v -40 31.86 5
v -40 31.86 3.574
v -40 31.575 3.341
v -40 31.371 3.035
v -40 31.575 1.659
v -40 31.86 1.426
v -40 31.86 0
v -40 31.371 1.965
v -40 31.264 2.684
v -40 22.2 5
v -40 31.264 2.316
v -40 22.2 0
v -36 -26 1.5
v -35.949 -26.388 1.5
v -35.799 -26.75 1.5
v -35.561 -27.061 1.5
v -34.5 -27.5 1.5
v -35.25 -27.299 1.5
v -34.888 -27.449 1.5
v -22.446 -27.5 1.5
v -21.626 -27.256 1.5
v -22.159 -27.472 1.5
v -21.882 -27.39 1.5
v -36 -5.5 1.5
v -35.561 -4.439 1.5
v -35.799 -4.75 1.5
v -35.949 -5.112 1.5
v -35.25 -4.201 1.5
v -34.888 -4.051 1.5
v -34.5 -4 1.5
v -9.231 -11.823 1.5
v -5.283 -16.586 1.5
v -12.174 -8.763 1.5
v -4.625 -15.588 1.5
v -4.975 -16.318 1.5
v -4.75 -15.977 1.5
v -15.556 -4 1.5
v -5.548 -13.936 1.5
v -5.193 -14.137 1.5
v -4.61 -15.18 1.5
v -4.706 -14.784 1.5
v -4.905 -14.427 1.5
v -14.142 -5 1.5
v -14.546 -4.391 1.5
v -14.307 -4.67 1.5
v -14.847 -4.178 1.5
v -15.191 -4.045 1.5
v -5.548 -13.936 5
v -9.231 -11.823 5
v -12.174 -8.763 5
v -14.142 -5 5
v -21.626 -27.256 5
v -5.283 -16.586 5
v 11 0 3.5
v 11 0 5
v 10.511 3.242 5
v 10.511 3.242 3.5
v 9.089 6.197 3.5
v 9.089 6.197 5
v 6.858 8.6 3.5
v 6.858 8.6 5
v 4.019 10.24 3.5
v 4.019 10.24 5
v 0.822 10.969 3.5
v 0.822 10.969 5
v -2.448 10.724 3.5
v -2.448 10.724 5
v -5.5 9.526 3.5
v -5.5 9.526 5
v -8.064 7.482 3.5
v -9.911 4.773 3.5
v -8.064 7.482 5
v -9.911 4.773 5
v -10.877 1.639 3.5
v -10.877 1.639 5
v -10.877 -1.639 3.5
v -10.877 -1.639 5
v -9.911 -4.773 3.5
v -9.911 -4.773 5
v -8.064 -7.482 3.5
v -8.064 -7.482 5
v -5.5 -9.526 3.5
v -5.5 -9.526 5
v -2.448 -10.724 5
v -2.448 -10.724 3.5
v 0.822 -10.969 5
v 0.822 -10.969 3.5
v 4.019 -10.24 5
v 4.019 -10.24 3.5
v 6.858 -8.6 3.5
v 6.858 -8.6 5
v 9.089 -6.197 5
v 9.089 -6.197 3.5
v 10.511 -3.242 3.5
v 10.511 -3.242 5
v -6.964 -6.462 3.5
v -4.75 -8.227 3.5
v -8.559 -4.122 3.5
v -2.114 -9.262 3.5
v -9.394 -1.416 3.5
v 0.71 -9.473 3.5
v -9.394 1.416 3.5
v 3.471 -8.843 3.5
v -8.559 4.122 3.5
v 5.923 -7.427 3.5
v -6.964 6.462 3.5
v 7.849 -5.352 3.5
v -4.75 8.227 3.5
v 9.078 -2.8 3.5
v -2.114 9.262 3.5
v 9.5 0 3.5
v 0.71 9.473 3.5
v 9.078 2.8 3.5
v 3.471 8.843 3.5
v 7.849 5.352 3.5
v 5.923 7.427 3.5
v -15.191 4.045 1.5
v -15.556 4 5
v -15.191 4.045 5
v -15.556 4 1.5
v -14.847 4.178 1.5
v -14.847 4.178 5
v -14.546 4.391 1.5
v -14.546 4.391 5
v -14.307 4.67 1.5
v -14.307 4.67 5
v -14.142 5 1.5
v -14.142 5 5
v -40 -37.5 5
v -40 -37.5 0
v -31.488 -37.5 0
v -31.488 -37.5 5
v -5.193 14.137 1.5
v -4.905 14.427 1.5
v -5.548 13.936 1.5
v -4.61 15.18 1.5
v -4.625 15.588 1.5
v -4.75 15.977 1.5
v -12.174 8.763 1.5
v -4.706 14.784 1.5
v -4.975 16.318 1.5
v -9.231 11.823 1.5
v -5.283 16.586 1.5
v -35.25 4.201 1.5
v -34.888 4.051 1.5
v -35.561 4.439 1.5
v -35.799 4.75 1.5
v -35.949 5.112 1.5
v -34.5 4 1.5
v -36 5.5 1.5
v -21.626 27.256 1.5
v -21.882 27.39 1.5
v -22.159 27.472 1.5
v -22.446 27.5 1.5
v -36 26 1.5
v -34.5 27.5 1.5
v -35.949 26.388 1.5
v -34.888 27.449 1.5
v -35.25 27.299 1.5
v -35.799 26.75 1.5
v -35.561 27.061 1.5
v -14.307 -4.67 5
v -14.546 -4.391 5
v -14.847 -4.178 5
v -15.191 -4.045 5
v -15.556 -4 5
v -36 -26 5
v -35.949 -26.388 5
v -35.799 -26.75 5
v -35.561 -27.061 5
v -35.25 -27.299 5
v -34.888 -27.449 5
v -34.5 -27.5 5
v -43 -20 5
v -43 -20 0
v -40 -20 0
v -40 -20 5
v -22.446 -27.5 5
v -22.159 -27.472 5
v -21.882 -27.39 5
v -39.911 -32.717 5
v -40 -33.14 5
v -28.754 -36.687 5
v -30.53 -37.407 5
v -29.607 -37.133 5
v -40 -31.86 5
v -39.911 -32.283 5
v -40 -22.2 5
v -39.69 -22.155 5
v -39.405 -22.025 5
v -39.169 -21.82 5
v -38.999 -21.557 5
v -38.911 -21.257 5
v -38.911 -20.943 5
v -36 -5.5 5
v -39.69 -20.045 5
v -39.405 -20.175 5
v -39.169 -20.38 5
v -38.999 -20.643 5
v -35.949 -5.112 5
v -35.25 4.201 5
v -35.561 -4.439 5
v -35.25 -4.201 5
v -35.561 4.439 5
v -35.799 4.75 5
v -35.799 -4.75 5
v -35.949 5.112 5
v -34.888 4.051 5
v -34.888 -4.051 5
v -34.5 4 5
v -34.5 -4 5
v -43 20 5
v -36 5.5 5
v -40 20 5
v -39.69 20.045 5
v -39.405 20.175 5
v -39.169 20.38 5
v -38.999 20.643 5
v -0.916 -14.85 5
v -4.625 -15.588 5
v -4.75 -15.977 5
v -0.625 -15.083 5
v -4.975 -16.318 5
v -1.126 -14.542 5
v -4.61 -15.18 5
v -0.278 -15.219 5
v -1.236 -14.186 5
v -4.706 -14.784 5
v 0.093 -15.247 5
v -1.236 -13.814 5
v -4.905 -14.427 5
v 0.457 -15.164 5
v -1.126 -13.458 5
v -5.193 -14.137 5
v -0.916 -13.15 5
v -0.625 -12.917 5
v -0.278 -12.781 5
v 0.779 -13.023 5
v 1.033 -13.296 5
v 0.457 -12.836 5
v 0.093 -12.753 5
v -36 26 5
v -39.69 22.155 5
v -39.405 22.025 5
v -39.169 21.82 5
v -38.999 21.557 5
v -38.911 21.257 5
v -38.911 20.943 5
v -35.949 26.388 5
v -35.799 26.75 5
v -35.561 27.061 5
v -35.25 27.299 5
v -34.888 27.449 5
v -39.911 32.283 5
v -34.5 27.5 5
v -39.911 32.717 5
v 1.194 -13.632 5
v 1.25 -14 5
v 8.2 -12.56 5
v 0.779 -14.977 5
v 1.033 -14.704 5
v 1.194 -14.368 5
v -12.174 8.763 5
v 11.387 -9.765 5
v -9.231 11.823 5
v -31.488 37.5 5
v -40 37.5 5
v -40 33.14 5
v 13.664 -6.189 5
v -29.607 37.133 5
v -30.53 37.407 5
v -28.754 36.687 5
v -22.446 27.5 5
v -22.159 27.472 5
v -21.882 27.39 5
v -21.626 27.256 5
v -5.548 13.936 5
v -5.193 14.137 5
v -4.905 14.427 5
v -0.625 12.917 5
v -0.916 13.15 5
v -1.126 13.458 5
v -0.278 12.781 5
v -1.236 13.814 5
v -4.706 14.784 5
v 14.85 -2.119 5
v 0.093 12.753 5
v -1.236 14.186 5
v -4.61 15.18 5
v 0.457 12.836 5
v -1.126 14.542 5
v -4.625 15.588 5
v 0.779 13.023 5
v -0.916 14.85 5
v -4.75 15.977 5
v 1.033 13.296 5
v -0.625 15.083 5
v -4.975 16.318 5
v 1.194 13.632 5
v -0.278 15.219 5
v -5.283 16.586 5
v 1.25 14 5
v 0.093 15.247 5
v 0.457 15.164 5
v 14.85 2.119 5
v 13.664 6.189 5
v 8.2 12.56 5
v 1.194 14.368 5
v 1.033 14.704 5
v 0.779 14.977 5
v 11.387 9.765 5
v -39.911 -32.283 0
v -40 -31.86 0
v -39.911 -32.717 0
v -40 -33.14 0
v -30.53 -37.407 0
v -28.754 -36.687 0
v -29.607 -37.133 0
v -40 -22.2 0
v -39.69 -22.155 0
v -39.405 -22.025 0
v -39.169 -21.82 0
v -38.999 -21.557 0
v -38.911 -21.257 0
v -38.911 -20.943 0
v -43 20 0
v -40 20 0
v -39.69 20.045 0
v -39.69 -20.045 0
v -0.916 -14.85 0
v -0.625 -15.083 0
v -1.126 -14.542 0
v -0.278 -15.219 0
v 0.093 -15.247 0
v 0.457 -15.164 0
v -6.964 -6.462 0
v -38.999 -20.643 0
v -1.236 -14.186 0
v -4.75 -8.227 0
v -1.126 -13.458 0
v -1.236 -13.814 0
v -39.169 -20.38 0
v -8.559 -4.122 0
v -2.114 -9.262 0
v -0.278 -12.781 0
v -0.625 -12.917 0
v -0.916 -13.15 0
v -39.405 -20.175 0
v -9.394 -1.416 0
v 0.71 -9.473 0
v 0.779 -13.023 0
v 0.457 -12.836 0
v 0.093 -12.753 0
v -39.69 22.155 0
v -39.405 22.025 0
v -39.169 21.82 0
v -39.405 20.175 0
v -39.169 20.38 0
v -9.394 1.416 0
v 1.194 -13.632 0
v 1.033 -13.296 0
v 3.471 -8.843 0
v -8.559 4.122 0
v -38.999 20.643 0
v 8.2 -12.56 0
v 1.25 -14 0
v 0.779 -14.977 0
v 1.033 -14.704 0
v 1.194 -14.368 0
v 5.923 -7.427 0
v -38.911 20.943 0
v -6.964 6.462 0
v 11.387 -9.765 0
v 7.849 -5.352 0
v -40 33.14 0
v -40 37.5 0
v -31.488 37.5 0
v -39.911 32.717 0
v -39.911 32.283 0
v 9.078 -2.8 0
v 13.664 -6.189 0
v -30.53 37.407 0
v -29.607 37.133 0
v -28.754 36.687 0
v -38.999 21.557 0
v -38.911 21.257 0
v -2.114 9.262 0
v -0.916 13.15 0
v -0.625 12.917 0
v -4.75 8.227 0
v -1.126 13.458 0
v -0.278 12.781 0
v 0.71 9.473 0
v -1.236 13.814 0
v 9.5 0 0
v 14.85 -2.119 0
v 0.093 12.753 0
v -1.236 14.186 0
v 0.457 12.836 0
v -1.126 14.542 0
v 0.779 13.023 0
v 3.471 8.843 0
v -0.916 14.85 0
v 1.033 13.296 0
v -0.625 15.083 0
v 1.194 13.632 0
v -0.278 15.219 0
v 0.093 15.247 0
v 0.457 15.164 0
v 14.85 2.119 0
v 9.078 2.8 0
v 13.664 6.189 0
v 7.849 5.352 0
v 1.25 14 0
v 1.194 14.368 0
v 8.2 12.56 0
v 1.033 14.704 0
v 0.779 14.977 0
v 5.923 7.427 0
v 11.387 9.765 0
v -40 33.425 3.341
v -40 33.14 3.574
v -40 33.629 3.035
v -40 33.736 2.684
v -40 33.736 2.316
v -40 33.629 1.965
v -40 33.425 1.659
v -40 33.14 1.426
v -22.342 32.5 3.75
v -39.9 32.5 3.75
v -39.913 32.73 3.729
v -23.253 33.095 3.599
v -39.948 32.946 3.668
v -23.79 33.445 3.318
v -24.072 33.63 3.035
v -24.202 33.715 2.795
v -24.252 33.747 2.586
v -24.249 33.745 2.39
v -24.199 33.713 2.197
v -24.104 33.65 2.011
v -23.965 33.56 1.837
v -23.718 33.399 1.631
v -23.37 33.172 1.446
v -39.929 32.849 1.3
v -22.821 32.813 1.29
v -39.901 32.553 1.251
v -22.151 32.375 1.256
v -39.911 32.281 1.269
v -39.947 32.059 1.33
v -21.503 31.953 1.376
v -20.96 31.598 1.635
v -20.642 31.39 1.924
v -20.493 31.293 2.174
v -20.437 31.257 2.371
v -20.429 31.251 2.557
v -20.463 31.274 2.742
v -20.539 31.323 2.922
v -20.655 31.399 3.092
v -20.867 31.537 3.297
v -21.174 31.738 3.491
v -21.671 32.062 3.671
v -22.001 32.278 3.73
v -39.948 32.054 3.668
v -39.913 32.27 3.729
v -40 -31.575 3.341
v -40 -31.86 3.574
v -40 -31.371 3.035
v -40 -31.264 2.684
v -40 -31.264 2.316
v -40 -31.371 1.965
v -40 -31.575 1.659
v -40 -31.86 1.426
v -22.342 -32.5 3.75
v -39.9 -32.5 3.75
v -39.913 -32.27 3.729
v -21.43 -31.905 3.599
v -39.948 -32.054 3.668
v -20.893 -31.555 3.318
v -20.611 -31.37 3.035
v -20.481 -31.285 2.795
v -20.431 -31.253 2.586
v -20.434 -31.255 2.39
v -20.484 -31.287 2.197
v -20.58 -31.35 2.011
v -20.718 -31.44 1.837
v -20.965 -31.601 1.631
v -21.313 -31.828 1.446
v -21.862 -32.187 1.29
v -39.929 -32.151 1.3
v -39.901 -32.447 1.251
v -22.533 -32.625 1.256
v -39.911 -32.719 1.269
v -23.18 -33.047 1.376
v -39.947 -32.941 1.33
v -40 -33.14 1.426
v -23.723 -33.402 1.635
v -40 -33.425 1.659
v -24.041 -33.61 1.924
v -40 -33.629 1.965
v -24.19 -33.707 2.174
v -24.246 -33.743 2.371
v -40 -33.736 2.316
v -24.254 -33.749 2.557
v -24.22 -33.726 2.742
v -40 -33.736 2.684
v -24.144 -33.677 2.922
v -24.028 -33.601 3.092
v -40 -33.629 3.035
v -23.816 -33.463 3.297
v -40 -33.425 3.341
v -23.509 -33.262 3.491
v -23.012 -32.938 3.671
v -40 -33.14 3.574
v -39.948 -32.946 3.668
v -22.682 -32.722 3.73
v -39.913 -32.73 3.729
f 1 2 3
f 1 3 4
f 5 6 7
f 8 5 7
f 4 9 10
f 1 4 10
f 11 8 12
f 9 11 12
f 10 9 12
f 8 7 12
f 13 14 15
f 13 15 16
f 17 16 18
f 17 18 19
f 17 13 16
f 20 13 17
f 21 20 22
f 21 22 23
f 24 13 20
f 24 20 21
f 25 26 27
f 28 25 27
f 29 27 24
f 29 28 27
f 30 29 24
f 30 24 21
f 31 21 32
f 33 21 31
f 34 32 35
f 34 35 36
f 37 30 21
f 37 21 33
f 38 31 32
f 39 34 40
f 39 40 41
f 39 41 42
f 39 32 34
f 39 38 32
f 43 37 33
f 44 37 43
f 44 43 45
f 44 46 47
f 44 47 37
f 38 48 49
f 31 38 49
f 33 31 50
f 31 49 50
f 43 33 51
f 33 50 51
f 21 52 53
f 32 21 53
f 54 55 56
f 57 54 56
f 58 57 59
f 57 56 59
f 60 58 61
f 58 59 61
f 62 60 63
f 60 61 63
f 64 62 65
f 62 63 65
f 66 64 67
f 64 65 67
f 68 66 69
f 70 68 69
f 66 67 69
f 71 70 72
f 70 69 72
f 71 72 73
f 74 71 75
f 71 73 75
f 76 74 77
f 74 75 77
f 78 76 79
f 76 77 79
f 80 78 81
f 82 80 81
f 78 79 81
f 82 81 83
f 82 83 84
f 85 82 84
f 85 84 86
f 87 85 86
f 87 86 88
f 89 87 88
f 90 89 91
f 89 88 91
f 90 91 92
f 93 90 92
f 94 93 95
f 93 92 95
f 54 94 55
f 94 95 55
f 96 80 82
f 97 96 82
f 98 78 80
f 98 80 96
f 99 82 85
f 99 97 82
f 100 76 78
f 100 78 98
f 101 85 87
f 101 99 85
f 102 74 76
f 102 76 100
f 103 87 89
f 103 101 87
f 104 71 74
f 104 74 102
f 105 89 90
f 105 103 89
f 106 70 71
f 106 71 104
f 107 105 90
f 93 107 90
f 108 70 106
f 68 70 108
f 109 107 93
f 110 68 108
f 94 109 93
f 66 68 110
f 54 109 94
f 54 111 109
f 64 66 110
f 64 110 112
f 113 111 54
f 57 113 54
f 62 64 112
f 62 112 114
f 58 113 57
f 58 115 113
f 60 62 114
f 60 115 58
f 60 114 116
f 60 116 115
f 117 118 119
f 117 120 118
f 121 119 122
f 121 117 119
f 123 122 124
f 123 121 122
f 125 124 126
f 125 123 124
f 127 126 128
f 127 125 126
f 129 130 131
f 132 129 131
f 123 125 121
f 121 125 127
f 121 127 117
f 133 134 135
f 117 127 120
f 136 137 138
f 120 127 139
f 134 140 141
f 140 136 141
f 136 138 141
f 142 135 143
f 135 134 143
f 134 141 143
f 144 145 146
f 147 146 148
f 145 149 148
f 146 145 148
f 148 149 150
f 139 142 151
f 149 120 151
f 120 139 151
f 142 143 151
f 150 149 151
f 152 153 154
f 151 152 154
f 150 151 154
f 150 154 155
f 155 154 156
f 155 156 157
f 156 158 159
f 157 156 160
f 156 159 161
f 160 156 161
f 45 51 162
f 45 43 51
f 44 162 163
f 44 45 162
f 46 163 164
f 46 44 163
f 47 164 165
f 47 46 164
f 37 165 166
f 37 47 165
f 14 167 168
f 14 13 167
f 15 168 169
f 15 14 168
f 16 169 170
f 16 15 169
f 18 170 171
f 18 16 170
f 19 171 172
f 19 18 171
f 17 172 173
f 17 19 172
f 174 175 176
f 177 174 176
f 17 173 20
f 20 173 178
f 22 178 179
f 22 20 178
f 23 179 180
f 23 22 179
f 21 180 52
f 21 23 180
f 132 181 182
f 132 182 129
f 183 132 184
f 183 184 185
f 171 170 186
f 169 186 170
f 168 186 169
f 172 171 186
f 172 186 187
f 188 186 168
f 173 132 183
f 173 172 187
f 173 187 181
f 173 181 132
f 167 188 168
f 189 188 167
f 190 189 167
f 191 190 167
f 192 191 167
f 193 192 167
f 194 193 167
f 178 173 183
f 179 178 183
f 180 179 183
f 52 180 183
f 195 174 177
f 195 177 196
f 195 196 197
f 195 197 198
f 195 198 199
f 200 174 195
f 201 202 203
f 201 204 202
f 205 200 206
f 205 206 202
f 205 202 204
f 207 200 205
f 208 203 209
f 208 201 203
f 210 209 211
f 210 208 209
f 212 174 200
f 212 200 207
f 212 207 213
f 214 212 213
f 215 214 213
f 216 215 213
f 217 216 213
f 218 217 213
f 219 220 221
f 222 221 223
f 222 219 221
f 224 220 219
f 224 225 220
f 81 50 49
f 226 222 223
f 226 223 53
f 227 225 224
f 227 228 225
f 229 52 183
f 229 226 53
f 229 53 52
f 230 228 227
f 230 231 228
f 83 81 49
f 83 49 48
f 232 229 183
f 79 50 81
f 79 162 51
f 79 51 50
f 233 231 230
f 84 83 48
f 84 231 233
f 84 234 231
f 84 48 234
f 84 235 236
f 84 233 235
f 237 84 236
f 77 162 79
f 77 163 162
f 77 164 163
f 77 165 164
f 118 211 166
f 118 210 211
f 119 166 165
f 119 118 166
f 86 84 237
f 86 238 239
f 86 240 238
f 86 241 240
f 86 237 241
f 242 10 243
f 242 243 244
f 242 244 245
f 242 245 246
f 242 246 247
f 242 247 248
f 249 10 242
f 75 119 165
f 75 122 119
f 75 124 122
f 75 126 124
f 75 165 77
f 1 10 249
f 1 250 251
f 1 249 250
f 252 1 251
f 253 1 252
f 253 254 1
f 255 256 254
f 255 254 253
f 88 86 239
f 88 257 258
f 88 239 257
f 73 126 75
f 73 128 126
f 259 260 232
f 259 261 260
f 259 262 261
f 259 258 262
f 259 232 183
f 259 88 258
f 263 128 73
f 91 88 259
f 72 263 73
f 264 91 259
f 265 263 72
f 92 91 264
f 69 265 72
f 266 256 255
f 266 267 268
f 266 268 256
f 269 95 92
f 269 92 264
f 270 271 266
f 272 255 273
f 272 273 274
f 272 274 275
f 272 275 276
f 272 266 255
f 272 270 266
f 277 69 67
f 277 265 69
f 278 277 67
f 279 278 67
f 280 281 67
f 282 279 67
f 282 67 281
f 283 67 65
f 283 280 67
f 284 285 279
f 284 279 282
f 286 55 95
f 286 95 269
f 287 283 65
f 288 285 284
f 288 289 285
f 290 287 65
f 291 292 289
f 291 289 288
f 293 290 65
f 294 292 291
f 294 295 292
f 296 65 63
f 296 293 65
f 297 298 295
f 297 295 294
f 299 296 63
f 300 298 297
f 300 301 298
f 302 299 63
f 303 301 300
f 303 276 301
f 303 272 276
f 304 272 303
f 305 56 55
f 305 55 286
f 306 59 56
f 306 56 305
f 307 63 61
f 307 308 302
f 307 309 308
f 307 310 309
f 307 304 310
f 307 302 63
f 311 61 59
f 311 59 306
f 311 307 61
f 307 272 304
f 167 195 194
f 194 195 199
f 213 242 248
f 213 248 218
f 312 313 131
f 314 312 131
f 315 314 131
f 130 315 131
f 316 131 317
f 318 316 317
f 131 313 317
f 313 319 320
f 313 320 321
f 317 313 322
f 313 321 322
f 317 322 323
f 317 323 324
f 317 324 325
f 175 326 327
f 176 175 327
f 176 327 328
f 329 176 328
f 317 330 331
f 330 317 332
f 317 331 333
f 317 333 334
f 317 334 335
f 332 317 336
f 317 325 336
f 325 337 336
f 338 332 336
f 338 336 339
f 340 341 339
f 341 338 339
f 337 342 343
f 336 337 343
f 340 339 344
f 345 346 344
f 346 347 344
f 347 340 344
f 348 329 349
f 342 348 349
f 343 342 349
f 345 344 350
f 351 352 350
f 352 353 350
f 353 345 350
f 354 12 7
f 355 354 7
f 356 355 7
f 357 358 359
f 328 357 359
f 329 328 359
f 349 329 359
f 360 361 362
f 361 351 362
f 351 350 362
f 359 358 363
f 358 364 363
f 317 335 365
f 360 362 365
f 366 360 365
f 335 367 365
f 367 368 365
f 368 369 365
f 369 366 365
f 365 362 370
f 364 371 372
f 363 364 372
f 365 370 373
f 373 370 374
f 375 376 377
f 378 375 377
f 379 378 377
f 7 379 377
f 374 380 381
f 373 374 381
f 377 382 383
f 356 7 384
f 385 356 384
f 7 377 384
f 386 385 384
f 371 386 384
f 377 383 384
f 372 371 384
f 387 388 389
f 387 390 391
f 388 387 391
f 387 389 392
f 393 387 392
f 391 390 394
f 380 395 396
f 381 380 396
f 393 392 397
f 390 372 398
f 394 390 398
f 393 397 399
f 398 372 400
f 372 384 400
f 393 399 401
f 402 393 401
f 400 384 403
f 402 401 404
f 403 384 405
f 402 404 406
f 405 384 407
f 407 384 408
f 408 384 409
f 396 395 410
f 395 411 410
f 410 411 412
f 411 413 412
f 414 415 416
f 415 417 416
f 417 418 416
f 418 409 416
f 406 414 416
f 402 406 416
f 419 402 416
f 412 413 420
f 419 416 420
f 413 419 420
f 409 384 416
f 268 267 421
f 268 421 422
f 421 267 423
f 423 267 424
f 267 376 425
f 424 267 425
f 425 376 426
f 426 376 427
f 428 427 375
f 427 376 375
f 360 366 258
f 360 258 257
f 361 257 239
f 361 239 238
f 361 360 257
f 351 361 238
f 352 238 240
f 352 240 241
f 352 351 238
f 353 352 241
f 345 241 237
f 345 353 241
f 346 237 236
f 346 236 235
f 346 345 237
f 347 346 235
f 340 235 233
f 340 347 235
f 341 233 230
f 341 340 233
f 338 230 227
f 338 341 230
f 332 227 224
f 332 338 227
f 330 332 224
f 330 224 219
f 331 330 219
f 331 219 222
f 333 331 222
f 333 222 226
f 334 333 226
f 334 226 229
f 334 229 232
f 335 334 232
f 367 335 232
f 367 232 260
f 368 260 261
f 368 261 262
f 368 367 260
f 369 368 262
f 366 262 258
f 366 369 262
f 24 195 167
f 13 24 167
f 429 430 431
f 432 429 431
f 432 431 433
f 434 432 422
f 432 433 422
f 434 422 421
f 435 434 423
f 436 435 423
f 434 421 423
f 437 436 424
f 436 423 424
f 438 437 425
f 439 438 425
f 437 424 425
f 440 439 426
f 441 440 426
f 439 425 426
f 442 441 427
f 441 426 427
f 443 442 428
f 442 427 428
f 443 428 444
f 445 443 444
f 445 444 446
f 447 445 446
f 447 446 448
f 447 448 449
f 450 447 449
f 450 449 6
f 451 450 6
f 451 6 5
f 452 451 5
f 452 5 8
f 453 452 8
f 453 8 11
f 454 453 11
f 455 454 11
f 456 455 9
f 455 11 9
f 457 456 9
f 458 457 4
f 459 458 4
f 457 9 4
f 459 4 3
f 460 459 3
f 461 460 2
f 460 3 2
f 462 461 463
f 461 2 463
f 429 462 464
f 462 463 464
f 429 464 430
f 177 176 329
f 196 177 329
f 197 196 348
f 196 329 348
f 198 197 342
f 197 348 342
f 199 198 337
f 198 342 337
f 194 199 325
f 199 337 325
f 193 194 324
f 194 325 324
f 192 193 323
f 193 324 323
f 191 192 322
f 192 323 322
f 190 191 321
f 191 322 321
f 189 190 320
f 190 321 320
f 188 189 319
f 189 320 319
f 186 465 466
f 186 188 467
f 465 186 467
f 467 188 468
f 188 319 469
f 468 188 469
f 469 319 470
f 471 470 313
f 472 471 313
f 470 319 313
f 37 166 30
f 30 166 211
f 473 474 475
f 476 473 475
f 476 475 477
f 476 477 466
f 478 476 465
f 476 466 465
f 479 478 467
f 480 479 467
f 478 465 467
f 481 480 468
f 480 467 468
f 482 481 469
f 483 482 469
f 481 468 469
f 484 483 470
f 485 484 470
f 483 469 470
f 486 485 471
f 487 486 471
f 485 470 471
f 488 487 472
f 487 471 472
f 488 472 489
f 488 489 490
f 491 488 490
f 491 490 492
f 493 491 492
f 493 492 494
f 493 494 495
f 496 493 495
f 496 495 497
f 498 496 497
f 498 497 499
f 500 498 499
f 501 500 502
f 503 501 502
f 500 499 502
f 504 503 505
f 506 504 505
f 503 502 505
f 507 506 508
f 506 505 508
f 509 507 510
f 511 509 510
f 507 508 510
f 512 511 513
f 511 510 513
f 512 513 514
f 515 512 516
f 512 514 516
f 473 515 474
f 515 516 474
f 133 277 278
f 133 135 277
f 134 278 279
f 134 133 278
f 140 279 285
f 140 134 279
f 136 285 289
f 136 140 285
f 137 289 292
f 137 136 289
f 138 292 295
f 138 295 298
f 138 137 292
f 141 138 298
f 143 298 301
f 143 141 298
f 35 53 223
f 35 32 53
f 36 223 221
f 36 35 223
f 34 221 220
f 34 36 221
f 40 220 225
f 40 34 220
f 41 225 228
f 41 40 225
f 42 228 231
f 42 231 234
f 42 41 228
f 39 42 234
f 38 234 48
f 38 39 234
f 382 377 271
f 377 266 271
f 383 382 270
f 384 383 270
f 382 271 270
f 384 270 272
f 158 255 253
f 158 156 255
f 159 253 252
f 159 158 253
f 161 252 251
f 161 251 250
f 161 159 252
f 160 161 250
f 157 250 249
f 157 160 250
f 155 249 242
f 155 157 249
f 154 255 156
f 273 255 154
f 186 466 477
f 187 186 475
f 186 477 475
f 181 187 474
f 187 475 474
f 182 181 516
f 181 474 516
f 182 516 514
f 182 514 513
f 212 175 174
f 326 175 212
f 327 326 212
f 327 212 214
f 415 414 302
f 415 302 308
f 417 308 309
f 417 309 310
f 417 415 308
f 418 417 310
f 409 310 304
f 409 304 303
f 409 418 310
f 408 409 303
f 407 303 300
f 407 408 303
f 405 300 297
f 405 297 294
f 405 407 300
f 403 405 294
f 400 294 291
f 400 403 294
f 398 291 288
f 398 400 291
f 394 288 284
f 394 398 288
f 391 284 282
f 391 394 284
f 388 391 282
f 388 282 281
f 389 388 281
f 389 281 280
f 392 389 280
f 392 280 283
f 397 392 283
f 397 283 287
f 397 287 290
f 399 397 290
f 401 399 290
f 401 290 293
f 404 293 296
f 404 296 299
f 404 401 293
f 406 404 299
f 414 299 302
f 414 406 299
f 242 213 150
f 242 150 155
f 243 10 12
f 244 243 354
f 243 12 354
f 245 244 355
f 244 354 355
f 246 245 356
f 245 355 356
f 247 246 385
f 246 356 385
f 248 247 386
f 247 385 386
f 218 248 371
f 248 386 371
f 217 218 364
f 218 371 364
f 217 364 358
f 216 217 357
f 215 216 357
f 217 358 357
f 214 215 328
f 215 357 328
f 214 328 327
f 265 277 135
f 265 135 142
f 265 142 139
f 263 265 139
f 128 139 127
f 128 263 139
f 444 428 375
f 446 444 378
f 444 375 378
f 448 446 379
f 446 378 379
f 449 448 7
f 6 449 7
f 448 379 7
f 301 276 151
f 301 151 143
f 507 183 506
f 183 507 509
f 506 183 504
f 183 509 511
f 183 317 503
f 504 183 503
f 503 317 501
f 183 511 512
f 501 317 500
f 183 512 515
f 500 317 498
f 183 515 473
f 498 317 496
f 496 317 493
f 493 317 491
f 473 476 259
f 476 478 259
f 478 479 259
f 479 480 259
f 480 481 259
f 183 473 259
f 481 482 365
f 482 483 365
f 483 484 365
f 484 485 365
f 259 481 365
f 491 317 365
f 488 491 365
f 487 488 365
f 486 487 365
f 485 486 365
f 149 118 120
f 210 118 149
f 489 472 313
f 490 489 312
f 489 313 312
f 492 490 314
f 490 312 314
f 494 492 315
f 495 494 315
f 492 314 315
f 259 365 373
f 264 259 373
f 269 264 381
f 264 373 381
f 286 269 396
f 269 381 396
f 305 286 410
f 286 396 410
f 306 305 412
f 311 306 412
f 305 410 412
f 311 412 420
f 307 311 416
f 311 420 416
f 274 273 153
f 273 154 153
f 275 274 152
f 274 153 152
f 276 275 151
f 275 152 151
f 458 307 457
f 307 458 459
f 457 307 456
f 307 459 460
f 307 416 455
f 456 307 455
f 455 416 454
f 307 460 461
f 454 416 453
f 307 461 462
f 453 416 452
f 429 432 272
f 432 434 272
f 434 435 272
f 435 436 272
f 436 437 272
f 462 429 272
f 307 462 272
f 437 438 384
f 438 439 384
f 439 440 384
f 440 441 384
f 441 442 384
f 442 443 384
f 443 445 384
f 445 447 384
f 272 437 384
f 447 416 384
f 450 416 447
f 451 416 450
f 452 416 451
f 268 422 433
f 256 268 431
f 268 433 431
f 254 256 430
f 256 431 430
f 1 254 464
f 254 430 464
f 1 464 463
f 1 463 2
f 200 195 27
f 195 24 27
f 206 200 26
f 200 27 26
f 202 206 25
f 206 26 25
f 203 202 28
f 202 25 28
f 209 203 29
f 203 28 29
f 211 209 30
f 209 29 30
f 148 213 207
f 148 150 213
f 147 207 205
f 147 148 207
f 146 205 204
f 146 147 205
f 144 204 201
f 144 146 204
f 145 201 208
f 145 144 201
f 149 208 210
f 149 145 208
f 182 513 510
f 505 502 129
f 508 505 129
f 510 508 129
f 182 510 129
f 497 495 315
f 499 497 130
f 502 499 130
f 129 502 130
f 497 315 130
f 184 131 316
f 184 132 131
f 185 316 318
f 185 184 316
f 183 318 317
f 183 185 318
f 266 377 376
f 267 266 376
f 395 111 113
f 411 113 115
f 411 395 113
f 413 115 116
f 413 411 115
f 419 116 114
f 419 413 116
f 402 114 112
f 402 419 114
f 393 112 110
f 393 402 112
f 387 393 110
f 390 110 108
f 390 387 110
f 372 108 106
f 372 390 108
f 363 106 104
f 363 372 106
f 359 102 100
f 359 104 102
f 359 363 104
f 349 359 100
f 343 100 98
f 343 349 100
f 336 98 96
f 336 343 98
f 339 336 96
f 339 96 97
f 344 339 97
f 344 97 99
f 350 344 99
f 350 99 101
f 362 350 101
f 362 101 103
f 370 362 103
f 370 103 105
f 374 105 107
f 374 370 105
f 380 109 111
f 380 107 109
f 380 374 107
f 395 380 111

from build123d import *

# Parameters (mm, degrees)
SKETCH_2_W          = 3
SKETCH_2_H          = 40
SKETCH_2_R          = 9.5
SKETCH_2_R_2        = 1.25
EXTRUDE_1_DEPTH     = 5
FILLET_3_R          = 5
SKETCH_3_R          = 1.25
CUT_EXTRUDE_1_DEPTH = 56
SKETCH_4_R          = 1.1
CUT_EXTRUDE_2_DEPTH = 10
SKETCH_5_R          = 2.1
CUT_EXTRUDE_3_DEPTH = 10
SKETCH_7_R          = 11
CUT_EXTRUDE_5_DEPTH = 1.5
CUT_EXTRUDE_6_DEPTH = 3.5
FILLET_5_R          = 1.5


with BuildPart() as part:
    # ｽｹｯﾁ2 → ﾎﾞｽ - 押し出し1 (new body)
    with BuildSketch(Plane.XY):
        with Locations((-41.5, 0)):
            Rectangle(SKETCH_2_W, SKETCH_2_H)
        with BuildLine():
            Line((-40, 37.5), (-40, -37.5))
            Line((-40, -37.5), (-30, -37.5))
            Line((-30, -37.5), (8.20017536, -12.560140288))
            ThreePointArc((8.20017536, -12.560140288), (15, 0), (8.20017536, 12.560140288))
            Line((8.20017536, 12.560140288), (-30, 37.5))
            Line((-30, 37.5), (-40, 37.5))
        make_face()
        Circle(SKETCH_2_R, mode=Mode.SUBTRACT)
        with Locations((0, 14)):
            Circle(SKETCH_2_R_2, mode=Mode.SUBTRACT)
        with Locations((0, -14)):
            Circle(SKETCH_2_R_2, mode=Mode.SUBTRACT)
    extrude(amount=EXTRUDE_1_DEPTH)

    # ﾌｨﾚｯﾄ3
    fillet_3_edges = [part.edges().sort_by_distance(p)[0] for p in [
        (-30, 37.5, 2.5),
        (-30, -37.5, 2.5),
    ]]
    fillet(fillet_3_edges, radius=FILLET_3_R)

    # ｽｹｯﾁ3 → ｶｯﾄ - 押し出し1 (cut, through all)
    with BuildSketch(Plane.ZY.offset(40)):
        with Locations((2.5, -32.5)):
            Circle(SKETCH_3_R)
        with Locations((2.5, 32.5)):
            Circle(SKETCH_3_R)
    extrude(amount=-CUT_EXTRUDE_1_DEPTH, mode=Mode.SUBTRACT)

    # ｽｹｯﾁ4 → ｶｯﾄ - 押し出し2 (cut)
    with BuildSketch(Plane(origin=(0, 0, 0), x_dir=(-1, 0, 0), z_dir=(0, 0, -1))):
        with Locations((40, 21.1)):
            Circle(SKETCH_4_R)
        with Locations((40, -21.1)):
            Circle(SKETCH_4_R)
    extrude(amount=-CUT_EXTRUDE_2_DEPTH, mode=Mode.SUBTRACT)

    # ｽｹｯﾁ5 → ｶｯﾄ - 押し出し3 (cut)
    with BuildSketch(Plane(origin=(0, 0, 0), x_dir=(-1, 0, 0), z_dir=(0, 0, -1))):
        with Locations((42, 32.5)):
            Circle(SKETCH_5_R)
        with Locations((42, -32.5)):
            Circle(SKETCH_5_R)
    extrude(amount=-CUT_EXTRUDE_3_DEPTH, mode=Mode.SUBTRACT)

    # ｽｹｯﾁ7 → ｶｯﾄ - 押し出し5 (cut)
    with BuildSketch(Plane.XY.offset(5)):
        Circle(SKETCH_7_R)
    extrude(amount=-CUT_EXTRUDE_5_DEPTH, mode=Mode.SUBTRACT)

    # ｽｹｯﾁ8 → ｶｯﾄ - 押し出し6 (cut)
    with BuildSketch(Plane.XY.offset(5)):
        with BuildLine():
            Line((-36, -4), (-36, -27.5))
            Line((-36, -27.5), (-22, -27.5))
            Line((-22, -27.5), (-2.525791459, -14.785816768))
            ThreePointArc((-2.525791459, -14.785816768), (-10.059117169, -11.127181214), (-14.456832295, -4))
            Line((-14.456832295, -4), (-36, -4))
        make_face()
        with BuildLine():
            Line((-22, 27.5), (-2.525791459, 14.785816768))
            ThreePointArc((-2.525791459, 14.785816768), (-10.059117169, 11.127181214), (-14.456832295, 4))
            Line((-14.456832295, 4), (-36, 4))
            Line((-36, 4), (-36, 27.5))
            Line((-36, 27.5), (-22, 27.5))
        make_face()
    extrude(amount=-CUT_EXTRUDE_6_DEPTH, mode=Mode.SUBTRACT)

    # ﾌｨﾚｯﾄ5
    fillet_5_edges = [part.edges().sort_by_distance(p)[0] for p in [
        (-36, 27.5, 3.25),
        (-22, 27.5, 3.25),
        (-2.525791459, 14.785816768, 3.25),
        (-14.456832295, 4, 3.25),
        (-36, 4, 3.25),
        (-22, -27.5, 3.25),
        (-36, -27.5, 3.25),
        (-36, -4, 3.25),
        (-14.456832295, -4, 3.25),
        (-2.525791459, -14.785816768, 3.25),
    ]]
    fillet(fillet_5_edges, radius=FILLET_5_R)


solid = part.part
